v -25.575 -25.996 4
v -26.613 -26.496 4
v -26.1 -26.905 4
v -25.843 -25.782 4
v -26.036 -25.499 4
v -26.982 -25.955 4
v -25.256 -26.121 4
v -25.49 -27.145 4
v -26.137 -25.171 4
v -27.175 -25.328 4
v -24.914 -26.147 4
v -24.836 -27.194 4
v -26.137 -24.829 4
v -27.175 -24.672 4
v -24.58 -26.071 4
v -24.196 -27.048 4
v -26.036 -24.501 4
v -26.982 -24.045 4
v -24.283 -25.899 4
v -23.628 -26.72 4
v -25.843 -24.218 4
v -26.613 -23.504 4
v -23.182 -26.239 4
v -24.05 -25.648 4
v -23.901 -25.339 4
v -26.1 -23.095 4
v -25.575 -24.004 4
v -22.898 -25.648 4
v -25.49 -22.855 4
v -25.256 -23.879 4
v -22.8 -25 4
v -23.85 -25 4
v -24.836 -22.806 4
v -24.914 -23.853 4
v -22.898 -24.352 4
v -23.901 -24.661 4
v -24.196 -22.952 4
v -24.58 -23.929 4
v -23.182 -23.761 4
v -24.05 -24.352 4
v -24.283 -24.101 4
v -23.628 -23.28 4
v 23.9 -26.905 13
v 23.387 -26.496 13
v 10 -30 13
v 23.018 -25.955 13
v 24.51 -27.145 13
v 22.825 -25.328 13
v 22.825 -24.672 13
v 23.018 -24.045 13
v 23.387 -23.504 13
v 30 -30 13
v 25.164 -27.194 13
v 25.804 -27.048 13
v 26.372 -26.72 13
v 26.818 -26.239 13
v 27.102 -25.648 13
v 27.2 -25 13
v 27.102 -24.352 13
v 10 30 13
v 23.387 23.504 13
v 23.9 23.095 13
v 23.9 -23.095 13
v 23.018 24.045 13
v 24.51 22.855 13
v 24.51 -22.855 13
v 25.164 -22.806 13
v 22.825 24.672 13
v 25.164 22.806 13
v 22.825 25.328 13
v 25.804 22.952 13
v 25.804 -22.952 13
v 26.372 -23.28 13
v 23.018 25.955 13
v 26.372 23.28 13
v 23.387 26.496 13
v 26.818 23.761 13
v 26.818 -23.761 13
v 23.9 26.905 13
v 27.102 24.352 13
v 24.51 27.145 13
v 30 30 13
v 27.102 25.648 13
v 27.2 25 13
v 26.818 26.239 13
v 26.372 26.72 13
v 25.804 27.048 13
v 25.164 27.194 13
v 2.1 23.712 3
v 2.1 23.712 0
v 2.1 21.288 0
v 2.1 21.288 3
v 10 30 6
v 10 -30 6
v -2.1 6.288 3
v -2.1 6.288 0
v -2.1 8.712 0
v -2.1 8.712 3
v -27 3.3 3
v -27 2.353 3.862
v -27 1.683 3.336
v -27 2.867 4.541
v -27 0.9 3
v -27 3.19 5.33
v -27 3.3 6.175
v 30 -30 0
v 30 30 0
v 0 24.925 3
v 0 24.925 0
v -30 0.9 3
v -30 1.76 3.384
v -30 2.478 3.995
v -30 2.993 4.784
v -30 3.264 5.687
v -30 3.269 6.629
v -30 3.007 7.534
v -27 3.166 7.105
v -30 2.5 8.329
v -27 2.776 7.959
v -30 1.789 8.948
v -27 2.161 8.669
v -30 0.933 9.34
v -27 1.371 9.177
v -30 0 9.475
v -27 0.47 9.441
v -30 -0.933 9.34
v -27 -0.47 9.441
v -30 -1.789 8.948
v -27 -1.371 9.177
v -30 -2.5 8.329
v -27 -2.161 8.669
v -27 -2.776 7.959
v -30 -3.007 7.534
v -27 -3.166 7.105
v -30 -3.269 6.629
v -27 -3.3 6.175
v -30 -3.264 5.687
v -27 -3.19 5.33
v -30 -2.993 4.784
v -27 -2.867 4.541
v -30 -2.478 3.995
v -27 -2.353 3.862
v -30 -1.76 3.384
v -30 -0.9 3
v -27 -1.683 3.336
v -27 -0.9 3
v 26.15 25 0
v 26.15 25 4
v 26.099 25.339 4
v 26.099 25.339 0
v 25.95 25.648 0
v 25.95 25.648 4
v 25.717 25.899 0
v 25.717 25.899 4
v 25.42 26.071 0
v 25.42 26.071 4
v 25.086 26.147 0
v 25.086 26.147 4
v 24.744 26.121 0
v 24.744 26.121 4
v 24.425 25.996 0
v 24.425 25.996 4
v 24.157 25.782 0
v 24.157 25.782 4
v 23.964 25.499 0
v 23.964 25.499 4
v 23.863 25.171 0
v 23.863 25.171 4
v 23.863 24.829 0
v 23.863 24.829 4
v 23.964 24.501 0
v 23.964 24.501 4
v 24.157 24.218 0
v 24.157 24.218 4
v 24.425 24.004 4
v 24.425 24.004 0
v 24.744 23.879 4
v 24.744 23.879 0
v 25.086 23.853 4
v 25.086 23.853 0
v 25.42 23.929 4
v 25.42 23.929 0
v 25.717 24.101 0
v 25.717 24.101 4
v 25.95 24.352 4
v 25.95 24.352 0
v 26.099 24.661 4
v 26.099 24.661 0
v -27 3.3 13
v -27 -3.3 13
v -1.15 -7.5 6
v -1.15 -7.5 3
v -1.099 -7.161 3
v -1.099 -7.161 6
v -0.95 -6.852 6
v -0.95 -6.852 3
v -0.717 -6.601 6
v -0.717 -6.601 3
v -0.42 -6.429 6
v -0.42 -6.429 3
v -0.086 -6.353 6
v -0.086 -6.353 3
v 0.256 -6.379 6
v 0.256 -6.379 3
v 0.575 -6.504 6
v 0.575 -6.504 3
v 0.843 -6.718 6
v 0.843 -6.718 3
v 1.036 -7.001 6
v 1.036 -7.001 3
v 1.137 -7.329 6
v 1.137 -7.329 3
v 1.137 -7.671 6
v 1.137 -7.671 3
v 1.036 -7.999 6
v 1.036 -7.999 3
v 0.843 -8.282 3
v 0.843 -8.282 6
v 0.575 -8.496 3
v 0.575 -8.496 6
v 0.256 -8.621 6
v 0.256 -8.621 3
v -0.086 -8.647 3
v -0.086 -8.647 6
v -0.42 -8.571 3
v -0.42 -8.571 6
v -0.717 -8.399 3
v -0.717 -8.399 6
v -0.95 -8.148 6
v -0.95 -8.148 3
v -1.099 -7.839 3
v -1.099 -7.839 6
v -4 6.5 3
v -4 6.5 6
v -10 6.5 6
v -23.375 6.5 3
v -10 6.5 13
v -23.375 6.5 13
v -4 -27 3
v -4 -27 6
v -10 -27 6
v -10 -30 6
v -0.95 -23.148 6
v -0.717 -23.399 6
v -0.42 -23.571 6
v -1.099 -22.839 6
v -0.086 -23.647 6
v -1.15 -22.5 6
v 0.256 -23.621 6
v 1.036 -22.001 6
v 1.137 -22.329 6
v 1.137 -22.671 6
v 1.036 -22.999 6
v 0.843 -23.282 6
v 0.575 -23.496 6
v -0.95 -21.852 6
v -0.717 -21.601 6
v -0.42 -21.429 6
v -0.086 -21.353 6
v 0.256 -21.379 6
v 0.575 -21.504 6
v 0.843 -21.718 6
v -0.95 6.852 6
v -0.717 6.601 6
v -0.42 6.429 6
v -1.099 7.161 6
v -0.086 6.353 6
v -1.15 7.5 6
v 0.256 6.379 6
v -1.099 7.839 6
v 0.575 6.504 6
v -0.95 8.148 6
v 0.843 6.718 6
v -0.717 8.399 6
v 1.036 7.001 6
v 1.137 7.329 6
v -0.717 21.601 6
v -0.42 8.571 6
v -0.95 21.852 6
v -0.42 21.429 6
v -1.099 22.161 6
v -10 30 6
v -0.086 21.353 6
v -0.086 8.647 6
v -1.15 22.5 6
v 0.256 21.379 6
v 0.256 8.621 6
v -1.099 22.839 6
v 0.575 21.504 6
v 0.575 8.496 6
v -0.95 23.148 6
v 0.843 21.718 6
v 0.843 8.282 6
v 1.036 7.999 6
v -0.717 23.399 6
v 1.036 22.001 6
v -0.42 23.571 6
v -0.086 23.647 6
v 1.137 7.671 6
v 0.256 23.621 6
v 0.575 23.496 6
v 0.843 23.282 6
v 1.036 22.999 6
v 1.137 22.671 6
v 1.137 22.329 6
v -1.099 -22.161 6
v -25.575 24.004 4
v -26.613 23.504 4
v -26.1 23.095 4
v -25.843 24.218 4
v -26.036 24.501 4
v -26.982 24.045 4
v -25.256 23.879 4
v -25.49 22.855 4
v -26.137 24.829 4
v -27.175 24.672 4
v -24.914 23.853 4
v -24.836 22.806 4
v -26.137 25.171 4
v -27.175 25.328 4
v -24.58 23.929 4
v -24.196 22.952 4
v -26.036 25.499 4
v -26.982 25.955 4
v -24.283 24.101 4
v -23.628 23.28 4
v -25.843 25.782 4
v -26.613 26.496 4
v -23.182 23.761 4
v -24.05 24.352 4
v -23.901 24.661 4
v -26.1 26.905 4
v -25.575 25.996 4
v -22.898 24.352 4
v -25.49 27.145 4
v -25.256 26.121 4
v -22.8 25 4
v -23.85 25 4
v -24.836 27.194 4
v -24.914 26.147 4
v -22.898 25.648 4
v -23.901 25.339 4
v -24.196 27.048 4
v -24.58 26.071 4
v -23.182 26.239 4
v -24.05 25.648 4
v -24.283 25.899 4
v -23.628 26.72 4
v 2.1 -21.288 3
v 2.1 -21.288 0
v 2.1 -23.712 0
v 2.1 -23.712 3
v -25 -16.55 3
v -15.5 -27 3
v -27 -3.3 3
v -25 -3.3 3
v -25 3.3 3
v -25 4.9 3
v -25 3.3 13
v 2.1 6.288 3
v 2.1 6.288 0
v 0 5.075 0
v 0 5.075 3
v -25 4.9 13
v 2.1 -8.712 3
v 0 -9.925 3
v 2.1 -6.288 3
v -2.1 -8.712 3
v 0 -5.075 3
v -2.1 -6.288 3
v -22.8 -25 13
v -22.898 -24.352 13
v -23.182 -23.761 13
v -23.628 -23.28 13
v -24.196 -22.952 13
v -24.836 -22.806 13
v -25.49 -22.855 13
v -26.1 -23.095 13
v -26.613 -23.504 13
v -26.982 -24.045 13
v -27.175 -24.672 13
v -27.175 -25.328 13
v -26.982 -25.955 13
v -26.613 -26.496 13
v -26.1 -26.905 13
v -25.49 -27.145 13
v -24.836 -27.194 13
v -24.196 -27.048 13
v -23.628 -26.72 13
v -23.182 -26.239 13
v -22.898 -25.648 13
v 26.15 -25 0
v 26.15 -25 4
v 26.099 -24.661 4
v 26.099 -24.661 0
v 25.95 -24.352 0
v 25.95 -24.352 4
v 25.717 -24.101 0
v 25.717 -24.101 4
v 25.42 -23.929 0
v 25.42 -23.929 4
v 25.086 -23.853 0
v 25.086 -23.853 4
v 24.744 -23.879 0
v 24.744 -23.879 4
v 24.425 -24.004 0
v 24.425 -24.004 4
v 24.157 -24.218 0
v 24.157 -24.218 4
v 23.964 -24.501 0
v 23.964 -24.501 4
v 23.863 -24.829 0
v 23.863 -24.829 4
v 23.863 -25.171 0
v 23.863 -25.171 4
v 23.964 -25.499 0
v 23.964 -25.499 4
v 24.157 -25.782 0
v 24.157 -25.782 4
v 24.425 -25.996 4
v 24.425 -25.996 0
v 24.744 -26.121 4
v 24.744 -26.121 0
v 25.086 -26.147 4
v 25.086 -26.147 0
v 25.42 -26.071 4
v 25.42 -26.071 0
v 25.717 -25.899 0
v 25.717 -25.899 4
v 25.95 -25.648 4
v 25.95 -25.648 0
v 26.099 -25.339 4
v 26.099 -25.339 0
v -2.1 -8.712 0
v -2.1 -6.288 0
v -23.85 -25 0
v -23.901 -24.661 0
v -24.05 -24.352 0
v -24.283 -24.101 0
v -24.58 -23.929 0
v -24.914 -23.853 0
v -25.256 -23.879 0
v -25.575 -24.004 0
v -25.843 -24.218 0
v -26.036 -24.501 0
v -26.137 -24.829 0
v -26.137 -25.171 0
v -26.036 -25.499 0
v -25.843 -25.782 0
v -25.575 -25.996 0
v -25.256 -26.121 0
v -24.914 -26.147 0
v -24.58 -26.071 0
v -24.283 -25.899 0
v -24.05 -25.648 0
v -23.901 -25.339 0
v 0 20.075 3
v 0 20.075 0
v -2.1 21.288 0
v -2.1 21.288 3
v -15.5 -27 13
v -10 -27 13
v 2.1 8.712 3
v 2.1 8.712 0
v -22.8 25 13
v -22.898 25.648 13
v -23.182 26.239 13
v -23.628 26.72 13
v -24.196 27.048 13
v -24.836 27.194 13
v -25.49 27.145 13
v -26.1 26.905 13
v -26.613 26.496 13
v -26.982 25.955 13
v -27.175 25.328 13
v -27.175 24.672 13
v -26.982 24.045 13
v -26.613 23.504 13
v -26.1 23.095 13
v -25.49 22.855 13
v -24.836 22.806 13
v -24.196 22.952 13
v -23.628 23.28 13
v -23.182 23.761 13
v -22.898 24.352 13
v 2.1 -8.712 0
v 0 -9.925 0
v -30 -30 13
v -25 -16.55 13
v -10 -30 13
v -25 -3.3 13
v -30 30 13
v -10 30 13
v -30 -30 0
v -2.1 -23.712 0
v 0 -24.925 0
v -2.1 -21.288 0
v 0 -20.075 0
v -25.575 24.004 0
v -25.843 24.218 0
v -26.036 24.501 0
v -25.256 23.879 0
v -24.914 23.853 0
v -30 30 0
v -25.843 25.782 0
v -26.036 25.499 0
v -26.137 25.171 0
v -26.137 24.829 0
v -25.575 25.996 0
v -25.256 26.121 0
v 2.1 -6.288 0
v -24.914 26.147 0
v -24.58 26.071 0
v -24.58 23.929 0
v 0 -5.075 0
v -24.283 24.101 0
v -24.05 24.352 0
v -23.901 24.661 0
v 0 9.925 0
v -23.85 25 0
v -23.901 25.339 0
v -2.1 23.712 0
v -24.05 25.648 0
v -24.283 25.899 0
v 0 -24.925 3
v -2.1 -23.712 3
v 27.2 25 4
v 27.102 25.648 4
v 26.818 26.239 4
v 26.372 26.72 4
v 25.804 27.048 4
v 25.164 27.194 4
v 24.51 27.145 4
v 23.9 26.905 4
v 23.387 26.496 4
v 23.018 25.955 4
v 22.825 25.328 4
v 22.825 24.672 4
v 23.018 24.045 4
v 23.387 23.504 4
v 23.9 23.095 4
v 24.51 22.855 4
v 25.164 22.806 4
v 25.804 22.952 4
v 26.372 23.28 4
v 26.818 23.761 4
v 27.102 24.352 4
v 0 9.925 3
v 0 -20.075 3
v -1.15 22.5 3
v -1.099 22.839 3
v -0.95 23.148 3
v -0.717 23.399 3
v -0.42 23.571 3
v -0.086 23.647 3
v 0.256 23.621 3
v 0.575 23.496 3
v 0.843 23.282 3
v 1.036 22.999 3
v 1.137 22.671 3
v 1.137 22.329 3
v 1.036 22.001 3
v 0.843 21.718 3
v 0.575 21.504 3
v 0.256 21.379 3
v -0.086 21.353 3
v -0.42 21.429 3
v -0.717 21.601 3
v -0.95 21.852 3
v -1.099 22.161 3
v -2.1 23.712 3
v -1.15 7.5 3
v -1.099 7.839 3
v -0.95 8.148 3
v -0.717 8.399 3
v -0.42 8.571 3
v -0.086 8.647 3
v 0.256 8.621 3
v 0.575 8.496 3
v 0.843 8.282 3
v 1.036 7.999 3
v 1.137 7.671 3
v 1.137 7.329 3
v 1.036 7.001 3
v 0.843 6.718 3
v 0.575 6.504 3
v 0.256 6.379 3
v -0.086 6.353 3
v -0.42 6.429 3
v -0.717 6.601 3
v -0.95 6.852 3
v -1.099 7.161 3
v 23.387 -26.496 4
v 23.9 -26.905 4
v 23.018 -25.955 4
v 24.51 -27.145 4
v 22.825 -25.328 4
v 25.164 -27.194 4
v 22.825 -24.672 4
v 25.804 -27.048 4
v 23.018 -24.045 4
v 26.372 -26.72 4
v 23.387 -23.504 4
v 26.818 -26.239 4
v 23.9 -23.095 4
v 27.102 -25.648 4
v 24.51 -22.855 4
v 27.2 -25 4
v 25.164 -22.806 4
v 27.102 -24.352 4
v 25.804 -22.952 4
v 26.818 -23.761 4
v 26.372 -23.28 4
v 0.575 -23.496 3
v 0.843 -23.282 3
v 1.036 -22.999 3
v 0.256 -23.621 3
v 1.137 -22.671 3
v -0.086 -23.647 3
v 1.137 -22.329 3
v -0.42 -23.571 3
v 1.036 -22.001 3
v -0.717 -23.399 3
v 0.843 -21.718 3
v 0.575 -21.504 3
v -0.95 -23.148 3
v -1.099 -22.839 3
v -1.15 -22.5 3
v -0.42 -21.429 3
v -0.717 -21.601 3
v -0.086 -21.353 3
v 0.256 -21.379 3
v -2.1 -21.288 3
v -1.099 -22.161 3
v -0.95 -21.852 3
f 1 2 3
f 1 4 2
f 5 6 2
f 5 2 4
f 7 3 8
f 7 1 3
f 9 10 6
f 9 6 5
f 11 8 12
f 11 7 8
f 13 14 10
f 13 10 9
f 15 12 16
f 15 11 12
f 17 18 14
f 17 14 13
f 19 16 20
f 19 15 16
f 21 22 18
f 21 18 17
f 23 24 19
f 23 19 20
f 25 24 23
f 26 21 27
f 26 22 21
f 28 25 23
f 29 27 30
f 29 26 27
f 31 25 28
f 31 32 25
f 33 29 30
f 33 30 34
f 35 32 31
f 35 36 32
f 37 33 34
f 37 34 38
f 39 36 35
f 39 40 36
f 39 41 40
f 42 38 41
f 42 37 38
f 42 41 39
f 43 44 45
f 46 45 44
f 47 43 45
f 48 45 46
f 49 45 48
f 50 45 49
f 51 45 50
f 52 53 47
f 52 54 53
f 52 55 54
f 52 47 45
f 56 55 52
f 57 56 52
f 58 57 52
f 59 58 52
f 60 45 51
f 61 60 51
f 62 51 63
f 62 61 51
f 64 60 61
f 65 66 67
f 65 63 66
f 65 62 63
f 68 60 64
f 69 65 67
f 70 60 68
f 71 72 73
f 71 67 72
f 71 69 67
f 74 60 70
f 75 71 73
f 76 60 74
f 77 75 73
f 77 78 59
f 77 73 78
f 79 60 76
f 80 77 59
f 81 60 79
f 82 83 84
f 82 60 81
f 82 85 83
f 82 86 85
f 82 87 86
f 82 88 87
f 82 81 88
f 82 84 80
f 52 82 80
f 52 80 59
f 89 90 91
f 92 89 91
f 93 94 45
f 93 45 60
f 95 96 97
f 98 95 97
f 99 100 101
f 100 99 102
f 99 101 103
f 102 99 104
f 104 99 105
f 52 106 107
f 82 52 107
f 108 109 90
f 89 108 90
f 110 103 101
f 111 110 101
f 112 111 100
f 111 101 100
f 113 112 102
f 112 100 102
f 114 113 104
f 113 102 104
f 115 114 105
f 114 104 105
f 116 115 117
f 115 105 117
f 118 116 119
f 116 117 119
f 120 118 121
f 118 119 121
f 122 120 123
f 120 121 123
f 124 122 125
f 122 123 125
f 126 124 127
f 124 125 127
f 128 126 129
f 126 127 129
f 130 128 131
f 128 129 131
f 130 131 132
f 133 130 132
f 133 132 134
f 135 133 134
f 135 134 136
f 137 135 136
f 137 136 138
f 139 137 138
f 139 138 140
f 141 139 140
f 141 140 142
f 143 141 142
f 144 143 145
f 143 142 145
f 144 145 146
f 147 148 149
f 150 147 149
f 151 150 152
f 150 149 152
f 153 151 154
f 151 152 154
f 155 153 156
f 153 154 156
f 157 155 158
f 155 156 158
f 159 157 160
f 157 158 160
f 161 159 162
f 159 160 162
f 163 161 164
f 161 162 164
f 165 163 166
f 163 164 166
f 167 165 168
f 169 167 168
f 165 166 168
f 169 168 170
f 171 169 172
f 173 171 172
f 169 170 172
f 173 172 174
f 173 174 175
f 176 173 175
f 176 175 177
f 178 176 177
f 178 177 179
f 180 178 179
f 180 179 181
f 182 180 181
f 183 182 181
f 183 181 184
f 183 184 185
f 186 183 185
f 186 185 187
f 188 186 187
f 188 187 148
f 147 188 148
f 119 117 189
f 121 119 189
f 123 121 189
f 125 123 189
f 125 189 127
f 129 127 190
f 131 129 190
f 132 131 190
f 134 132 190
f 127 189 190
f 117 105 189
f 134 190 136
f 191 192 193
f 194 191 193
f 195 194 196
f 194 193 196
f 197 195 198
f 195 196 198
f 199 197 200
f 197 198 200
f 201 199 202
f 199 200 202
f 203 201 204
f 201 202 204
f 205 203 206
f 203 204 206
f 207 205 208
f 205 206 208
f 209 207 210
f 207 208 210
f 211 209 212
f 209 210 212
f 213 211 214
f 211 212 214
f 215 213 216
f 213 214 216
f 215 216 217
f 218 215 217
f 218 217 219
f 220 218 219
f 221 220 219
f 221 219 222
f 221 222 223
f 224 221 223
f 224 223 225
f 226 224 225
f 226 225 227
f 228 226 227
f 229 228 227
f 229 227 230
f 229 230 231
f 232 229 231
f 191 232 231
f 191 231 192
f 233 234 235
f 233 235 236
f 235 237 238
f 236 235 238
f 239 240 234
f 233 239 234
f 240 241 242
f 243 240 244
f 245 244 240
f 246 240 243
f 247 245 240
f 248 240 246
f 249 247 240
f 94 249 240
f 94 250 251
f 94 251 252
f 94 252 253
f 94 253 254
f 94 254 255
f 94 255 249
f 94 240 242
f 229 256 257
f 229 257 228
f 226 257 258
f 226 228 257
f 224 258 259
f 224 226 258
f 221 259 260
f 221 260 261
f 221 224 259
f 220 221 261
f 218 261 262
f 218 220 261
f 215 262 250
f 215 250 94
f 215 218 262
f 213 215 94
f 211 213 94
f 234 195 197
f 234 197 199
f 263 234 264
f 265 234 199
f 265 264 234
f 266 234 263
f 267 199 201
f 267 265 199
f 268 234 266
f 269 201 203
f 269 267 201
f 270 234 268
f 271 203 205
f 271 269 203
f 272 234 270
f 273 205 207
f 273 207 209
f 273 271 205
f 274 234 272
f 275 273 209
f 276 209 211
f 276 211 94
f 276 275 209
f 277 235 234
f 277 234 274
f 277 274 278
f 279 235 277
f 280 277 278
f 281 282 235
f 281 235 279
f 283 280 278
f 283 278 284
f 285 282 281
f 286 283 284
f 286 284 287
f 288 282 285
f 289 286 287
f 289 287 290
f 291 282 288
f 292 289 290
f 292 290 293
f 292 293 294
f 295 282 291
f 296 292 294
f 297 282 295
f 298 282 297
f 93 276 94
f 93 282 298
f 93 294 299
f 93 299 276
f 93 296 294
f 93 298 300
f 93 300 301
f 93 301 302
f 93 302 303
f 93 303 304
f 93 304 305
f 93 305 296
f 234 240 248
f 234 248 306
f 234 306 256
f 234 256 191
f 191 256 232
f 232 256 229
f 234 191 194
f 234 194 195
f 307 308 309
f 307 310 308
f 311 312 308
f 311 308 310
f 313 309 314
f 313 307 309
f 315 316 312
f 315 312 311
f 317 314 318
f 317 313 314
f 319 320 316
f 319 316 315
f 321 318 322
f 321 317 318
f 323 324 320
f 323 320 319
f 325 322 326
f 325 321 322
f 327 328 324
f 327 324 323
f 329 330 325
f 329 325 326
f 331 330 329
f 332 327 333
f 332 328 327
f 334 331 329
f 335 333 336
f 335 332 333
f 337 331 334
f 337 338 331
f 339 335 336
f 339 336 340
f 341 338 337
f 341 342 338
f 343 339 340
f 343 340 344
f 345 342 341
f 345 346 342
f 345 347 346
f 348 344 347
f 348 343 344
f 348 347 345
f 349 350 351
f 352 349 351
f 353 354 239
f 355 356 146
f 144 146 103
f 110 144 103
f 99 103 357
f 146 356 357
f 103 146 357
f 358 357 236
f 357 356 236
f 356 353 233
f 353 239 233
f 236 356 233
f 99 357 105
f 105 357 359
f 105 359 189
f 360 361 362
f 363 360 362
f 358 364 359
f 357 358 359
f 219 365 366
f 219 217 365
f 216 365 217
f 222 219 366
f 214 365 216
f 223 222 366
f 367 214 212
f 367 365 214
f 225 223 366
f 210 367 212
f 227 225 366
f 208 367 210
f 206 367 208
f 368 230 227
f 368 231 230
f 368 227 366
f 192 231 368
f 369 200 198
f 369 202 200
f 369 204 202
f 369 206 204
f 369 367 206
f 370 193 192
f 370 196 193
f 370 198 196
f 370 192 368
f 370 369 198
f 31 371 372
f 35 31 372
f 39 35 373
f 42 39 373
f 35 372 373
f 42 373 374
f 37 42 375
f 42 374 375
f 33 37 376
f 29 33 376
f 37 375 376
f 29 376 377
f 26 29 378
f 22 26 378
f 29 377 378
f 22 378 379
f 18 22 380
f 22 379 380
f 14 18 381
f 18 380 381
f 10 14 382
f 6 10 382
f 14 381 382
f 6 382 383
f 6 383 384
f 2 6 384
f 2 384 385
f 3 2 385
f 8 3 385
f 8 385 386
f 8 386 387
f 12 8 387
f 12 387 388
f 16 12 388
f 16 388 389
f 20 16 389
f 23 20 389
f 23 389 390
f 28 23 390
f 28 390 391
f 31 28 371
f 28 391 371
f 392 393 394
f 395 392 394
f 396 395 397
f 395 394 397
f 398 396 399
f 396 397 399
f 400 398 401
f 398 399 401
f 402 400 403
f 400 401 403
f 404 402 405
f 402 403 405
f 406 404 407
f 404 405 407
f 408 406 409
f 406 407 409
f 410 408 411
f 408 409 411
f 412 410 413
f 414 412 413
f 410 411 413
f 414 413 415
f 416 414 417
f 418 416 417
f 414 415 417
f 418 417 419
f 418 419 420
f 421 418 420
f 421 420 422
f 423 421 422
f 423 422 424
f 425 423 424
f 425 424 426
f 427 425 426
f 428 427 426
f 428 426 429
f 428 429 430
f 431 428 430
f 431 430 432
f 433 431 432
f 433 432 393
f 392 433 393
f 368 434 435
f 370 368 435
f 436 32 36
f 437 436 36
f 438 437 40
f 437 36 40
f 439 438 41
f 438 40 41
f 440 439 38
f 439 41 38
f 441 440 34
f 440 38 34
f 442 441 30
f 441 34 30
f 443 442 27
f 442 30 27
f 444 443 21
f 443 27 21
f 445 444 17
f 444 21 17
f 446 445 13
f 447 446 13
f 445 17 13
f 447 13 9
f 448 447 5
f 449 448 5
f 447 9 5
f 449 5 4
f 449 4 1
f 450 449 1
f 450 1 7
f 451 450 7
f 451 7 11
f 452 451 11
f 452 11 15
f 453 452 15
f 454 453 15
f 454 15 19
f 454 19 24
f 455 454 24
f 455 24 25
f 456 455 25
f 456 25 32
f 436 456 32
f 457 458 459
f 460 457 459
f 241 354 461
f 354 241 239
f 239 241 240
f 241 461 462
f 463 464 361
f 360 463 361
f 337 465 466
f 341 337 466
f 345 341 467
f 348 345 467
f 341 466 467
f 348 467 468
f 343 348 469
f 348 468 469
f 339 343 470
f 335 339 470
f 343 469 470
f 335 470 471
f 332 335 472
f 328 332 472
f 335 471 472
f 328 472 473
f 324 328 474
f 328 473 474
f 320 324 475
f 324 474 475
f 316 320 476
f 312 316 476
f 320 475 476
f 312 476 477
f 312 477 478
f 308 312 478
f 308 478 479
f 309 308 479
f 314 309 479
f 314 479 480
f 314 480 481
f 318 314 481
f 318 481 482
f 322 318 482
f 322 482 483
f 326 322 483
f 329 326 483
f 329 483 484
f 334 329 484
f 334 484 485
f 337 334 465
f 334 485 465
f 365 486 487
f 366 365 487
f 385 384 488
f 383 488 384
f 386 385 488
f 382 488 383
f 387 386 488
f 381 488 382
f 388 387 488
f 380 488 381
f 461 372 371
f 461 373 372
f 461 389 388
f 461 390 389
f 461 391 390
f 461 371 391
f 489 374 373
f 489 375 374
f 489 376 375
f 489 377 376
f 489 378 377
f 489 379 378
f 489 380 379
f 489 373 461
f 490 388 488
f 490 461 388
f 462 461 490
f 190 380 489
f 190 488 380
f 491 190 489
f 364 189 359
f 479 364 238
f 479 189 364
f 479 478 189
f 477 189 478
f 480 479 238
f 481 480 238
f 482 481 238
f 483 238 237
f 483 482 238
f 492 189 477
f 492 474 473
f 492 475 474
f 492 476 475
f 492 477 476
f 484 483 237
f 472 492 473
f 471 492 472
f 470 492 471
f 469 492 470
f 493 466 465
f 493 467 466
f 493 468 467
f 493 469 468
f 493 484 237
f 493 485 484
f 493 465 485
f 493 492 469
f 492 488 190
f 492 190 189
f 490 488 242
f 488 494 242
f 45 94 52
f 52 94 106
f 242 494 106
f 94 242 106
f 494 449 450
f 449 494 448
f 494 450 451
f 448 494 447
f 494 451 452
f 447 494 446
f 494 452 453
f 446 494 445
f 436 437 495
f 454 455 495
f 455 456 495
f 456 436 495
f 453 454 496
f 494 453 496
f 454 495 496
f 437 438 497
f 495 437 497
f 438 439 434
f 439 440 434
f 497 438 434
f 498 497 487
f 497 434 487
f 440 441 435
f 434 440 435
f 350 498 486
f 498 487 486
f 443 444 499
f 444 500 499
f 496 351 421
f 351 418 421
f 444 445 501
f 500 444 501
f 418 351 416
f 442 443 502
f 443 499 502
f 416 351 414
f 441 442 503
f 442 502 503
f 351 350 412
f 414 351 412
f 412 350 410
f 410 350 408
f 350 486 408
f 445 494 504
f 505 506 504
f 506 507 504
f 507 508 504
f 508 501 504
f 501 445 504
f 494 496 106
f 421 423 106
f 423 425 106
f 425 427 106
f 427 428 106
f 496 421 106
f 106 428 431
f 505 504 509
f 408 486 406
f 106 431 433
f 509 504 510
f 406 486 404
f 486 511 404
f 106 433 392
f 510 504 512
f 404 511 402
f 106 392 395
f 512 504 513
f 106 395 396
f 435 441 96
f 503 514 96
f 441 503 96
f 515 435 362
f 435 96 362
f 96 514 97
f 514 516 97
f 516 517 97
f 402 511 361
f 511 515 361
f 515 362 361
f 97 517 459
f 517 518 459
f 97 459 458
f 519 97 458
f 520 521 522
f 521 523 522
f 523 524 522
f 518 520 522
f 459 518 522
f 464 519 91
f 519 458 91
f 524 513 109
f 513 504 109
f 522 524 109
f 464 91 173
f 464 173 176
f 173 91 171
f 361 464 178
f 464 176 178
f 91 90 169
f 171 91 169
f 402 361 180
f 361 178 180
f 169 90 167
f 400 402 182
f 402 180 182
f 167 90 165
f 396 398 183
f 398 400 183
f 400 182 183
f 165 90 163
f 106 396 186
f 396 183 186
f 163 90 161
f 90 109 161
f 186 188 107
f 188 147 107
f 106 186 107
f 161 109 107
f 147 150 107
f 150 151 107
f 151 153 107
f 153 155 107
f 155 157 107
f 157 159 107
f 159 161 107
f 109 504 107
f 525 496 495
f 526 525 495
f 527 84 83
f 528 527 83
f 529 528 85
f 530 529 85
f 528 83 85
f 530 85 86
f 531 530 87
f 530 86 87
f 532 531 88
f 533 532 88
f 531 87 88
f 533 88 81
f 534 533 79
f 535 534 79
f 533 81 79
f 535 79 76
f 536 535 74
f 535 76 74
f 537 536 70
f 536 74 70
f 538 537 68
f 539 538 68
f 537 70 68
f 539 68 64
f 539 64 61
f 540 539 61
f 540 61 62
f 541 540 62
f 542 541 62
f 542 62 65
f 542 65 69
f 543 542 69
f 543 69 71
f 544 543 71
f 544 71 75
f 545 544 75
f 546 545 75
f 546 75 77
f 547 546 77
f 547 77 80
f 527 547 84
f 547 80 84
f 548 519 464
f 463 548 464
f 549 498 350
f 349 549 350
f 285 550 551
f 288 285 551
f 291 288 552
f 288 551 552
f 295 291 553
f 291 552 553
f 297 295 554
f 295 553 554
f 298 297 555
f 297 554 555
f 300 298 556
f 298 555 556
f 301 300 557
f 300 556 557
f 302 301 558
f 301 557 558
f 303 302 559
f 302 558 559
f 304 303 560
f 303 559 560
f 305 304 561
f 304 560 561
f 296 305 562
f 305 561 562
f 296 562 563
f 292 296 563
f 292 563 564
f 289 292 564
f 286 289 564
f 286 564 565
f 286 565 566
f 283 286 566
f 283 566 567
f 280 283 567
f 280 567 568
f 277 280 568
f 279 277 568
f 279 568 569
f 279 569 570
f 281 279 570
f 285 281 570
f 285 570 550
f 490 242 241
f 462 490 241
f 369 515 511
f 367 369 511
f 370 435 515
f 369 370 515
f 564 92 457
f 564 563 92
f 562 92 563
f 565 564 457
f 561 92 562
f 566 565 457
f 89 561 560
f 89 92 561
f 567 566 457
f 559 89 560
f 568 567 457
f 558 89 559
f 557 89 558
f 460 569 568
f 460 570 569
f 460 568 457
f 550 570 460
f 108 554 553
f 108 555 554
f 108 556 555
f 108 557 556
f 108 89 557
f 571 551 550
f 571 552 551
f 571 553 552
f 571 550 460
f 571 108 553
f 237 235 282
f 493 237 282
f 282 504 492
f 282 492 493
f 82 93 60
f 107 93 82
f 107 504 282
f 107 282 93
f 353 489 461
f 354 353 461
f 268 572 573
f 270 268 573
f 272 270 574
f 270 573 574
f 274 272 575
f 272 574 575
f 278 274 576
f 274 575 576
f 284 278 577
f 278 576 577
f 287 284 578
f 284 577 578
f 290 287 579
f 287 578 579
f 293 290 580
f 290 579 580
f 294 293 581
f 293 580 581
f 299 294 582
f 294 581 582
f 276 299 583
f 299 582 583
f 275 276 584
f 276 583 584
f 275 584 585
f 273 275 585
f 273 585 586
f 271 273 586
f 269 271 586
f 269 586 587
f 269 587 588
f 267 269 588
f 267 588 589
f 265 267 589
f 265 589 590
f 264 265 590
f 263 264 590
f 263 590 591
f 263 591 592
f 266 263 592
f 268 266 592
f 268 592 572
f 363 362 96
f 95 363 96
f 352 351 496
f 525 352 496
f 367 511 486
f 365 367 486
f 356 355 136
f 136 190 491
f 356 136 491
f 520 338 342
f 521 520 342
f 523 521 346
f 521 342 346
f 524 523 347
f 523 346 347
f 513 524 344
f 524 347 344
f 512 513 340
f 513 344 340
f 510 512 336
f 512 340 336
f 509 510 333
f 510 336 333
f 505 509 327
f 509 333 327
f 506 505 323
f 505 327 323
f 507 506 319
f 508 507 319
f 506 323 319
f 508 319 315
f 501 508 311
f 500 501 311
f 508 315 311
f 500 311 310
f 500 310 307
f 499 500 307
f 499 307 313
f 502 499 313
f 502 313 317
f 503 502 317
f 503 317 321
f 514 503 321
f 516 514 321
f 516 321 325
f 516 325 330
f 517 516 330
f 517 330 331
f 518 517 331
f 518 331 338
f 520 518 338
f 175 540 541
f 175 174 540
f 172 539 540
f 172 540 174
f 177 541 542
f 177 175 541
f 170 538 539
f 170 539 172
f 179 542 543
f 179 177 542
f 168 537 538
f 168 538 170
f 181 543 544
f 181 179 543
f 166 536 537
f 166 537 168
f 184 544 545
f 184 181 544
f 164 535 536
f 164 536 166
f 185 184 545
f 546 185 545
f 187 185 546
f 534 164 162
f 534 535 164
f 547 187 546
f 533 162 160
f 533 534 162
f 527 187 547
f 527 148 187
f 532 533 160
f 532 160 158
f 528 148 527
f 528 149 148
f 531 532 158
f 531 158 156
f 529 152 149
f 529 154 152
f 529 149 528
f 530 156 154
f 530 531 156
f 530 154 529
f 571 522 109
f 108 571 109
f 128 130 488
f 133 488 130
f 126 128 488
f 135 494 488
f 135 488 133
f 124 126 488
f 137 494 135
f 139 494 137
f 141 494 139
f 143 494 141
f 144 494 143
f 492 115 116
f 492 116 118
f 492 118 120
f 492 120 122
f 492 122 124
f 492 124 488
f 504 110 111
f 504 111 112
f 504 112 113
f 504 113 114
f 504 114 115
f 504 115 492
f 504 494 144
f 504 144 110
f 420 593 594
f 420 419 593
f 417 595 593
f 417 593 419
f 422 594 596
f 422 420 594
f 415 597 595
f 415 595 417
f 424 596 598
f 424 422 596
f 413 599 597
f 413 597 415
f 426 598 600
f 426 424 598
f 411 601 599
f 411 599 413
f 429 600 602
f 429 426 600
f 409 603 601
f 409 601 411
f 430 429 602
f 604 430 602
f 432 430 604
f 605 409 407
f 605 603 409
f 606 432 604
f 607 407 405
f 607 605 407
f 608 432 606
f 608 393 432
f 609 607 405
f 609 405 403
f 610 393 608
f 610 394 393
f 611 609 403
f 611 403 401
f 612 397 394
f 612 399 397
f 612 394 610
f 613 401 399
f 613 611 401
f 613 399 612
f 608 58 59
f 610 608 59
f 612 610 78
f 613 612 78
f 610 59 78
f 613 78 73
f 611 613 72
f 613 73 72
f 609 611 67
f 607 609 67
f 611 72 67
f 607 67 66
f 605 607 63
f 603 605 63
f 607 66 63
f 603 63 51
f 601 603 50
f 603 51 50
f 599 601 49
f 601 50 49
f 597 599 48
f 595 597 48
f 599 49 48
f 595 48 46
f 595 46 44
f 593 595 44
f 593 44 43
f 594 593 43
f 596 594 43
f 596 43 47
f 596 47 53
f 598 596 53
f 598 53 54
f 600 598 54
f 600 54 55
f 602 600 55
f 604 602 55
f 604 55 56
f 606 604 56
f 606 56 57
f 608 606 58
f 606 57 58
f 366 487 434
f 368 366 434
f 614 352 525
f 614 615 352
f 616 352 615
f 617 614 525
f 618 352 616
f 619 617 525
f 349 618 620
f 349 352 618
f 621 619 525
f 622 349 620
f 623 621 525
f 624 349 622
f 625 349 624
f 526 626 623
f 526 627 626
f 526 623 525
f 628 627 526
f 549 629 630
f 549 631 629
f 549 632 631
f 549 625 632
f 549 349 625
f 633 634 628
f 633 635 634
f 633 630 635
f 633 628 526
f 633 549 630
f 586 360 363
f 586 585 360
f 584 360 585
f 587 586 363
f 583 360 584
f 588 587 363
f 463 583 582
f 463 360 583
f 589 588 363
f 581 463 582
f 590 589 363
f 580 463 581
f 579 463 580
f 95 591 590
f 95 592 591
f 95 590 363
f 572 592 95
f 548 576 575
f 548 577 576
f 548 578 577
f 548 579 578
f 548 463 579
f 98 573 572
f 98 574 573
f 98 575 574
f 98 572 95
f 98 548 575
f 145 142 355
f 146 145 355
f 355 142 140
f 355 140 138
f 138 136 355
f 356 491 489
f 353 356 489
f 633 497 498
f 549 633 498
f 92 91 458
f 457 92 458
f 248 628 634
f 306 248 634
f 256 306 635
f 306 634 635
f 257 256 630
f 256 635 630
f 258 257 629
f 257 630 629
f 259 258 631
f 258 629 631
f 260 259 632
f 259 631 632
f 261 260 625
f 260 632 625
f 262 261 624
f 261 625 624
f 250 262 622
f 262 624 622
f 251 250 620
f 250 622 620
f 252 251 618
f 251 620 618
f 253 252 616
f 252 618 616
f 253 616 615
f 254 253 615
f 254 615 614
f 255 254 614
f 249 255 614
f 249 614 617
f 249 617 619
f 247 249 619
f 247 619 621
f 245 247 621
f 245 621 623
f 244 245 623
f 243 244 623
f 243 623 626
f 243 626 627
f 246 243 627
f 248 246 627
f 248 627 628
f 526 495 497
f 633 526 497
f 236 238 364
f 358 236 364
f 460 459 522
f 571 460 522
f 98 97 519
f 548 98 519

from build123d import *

# Parameters (mm, degrees)
SKETCH1_W           = 60
SKETCH1_H           = 60
BOSS_EXTRUDE1_DEPTH = 6
CUT_EXTRUDE2_DEPTH  = 3
SKETCH12_R          = 1.15
CUT_EXTRUDE9_DEPTH  = 43.848570571
SKETCH5_W           = 20
SKETCH5_H           = 60
BOSS_EXTRUDE2_DEPTH = 7
SKETCH6_R           = 1.15
CUT_EXTRUDE4_DEPTH  = 45.373415465
SKETCH8_R           = 2.2
SKETCH8_R_2         = 1.15
CUT_EXTRUDE5_DEPTH  = 9
CUT_EXTRUDE6_DEPTH  = 10
SKETCH10_W          = 6
SKETCH10_H          = 33.5
CUT_EXTRUDE7_DEPTH  = 3
CUT_EXTRUDE8_DEPTH  = 66.711490624


with BuildPart() as part:
    # Sketch1 → Boss-Extrude1 (new body)
    with BuildSketch(Plane.XY):
        Rectangle(SKETCH1_W, SKETCH1_H)
    extrude(amount=BOSS_EXTRUDE1_DEPTH)

    # Sketch3 → Cut-Extrude2 (cut)
    with BuildSketch(Plane(origin=(0, 0, 0), x_dir=(-1, 0, 0), z_dir=(0, 0, -1))):
        Polygon((2.1, 6.287564435), (2.1, 8.712435565), (0, 9.924871131), (-2.1, 8.712435565), (-2.1, 6.287564435), (0, 5.075128869), align=None)
        Polygon((2.1, -8.712435565), (2.1, -6.287564435), (0, -5.075128869), (-2.1, -6.287564435), (-2.1, -8.712435565), (0, -9.924871131), align=None)
        Polygon((2.1, -23.712435565), (2.1, -21.287564435), (0, -20.075128869), (-2.1, -21.287564435), (-2.1, -23.712435565), (0, -24.924871131), align=None)
        Polygon((0, 20.075128869), (2.1, 21.287564435), (2.1, 23.712435565), (0, 24.924871131), (-2.1, 23.712435565), (-2.1, 21.287564435), align=None)
    extrude(amount=-CUT_EXTRUDE2_DEPTH, mode=Mode.SUBTRACT)

    # Sketch12 → Cut-Extrude9 (cut, through all)
    with BuildSketch(Plane(origin=(0, 0, 0), x_dir=(-1, 0, 0), z_dir=(0, 0, -1))):
        with Locations((0, 22.5)):
            Circle(SKETCH12_R)
        with Locations((0, 7.5)):
            Circle(SKETCH12_R)
        with Locations((0, -7.5)):
            Circle(SKETCH12_R)
        with Locations((0, -22.5)):
            Circle(SKETCH12_R)
    extrude(amount=-CUT_EXTRUDE9_DEPTH, mode=Mode.SUBTRACT)

    # Sketch5 → Boss-Extrude2 (add)
    with BuildSketch(Plane.XY.offset(6)):
        with Locations((-20, 0)):
            Rectangle(SKETCH5_W, SKETCH5_H)
        with Locations((20, 0)):
            Rectangle(SKETCH5_W, SKETCH5_H)
    extrude(amount=BOSS_EXTRUDE2_DEPTH)

    # Sketch6 → Cut-Extrude4 (cut, through all)
    with BuildSketch(Plane.XY.offset(13)):
        with Locations((-25, 25)):
            Circle(SKETCH6_R)
        with Locations((25, 25)):
            Circle(SKETCH6_R)
        with Locations((25, -25)):
            Circle(SKETCH6_R)
        with Locations((-25, -25)):
            Circle(SKETCH6_R)
    extrude(amount=-CUT_EXTRUDE4_DEPTH, mode=Mode.SUBTRACT)

    # Sketch8 → Cut-Extrude5 (cut)
    # profile 1 of 4: a face of its own
    with BuildSketch(Plane.XY.offset(13)):
        with Locations((-25, 25)):
            Circle(SKETCH8_R)
        with Locations((-25, 25)):
            Circle(SKETCH8_R_2, mode=Mode.SUBTRACT)
    # profile 2 of 4: a face of its own
    with BuildSketch(Plane.XY.offset(13)):
        with Locations((25, 25)):
            Circle(SKETCH8_R)
    # profile 3 of 4: a face of its own
    with BuildSketch(Plane.XY.offset(13)):
        with Locations((25, -25)):
            Circle(SKETCH8_R)
    # profile 4 of 4: a face of its own
    with BuildSketch(Plane.XY.offset(13)):
        with Locations((-25, -25)):
            Circle(SKETCH8_R)
        with Locations((-25, -25)):
            Circle(SKETCH8_R_2, mode=Mode.SUBTRACT)
    extrude(amount=-CUT_EXTRUDE5_DEPTH, mode=Mode.SUBTRACT)

    # Sketch9 → Cut-Extrude6 (cut)
    with BuildSketch(Plane.XY.offset(13)):
        Polygon((-25, -16.55), (-15.5, -27), (-10, -27), (-10, 6.5), (-23.375, 6.5), (-25, 4.9), (-25, 3.3), (-27, 3.3), (-27, -3.3), (-25, -3.3), align=None)
    extrude(amount=-CUT_EXTRUDE6_DEPTH, mode=Mode.SUBTRACT)

    # Sketch10 → Cut-Extrude7 (cut)
    with BuildSketch(Plane.XY.offset(6)):
        with Locations((-7, -10.25)):
            Rectangle(SKETCH10_W, SKETCH10_H)
    extrude(amount=-CUT_EXTRUDE7_DEPTH, mode=Mode.SUBTRACT)

    # Sketch11 → Cut-Extrude8 (cut, through all)
    with BuildSketch(Plane(origin=(-27, 0, 0), x_dir=(0, 0, -1), z_dir=(1, 0, 0))):
        with BuildLine():
            Line((-3, -0.899652711), (-3, 0.899652711))
            ThreePointArc((-3, 0.899652711), (-9.475, 0), (-3, -0.899652711))
        make_face()
    extrude(amount=-CUT_EXTRUDE8_DEPTH, mode=Mode.SUBTRACT)


solid = part.part
